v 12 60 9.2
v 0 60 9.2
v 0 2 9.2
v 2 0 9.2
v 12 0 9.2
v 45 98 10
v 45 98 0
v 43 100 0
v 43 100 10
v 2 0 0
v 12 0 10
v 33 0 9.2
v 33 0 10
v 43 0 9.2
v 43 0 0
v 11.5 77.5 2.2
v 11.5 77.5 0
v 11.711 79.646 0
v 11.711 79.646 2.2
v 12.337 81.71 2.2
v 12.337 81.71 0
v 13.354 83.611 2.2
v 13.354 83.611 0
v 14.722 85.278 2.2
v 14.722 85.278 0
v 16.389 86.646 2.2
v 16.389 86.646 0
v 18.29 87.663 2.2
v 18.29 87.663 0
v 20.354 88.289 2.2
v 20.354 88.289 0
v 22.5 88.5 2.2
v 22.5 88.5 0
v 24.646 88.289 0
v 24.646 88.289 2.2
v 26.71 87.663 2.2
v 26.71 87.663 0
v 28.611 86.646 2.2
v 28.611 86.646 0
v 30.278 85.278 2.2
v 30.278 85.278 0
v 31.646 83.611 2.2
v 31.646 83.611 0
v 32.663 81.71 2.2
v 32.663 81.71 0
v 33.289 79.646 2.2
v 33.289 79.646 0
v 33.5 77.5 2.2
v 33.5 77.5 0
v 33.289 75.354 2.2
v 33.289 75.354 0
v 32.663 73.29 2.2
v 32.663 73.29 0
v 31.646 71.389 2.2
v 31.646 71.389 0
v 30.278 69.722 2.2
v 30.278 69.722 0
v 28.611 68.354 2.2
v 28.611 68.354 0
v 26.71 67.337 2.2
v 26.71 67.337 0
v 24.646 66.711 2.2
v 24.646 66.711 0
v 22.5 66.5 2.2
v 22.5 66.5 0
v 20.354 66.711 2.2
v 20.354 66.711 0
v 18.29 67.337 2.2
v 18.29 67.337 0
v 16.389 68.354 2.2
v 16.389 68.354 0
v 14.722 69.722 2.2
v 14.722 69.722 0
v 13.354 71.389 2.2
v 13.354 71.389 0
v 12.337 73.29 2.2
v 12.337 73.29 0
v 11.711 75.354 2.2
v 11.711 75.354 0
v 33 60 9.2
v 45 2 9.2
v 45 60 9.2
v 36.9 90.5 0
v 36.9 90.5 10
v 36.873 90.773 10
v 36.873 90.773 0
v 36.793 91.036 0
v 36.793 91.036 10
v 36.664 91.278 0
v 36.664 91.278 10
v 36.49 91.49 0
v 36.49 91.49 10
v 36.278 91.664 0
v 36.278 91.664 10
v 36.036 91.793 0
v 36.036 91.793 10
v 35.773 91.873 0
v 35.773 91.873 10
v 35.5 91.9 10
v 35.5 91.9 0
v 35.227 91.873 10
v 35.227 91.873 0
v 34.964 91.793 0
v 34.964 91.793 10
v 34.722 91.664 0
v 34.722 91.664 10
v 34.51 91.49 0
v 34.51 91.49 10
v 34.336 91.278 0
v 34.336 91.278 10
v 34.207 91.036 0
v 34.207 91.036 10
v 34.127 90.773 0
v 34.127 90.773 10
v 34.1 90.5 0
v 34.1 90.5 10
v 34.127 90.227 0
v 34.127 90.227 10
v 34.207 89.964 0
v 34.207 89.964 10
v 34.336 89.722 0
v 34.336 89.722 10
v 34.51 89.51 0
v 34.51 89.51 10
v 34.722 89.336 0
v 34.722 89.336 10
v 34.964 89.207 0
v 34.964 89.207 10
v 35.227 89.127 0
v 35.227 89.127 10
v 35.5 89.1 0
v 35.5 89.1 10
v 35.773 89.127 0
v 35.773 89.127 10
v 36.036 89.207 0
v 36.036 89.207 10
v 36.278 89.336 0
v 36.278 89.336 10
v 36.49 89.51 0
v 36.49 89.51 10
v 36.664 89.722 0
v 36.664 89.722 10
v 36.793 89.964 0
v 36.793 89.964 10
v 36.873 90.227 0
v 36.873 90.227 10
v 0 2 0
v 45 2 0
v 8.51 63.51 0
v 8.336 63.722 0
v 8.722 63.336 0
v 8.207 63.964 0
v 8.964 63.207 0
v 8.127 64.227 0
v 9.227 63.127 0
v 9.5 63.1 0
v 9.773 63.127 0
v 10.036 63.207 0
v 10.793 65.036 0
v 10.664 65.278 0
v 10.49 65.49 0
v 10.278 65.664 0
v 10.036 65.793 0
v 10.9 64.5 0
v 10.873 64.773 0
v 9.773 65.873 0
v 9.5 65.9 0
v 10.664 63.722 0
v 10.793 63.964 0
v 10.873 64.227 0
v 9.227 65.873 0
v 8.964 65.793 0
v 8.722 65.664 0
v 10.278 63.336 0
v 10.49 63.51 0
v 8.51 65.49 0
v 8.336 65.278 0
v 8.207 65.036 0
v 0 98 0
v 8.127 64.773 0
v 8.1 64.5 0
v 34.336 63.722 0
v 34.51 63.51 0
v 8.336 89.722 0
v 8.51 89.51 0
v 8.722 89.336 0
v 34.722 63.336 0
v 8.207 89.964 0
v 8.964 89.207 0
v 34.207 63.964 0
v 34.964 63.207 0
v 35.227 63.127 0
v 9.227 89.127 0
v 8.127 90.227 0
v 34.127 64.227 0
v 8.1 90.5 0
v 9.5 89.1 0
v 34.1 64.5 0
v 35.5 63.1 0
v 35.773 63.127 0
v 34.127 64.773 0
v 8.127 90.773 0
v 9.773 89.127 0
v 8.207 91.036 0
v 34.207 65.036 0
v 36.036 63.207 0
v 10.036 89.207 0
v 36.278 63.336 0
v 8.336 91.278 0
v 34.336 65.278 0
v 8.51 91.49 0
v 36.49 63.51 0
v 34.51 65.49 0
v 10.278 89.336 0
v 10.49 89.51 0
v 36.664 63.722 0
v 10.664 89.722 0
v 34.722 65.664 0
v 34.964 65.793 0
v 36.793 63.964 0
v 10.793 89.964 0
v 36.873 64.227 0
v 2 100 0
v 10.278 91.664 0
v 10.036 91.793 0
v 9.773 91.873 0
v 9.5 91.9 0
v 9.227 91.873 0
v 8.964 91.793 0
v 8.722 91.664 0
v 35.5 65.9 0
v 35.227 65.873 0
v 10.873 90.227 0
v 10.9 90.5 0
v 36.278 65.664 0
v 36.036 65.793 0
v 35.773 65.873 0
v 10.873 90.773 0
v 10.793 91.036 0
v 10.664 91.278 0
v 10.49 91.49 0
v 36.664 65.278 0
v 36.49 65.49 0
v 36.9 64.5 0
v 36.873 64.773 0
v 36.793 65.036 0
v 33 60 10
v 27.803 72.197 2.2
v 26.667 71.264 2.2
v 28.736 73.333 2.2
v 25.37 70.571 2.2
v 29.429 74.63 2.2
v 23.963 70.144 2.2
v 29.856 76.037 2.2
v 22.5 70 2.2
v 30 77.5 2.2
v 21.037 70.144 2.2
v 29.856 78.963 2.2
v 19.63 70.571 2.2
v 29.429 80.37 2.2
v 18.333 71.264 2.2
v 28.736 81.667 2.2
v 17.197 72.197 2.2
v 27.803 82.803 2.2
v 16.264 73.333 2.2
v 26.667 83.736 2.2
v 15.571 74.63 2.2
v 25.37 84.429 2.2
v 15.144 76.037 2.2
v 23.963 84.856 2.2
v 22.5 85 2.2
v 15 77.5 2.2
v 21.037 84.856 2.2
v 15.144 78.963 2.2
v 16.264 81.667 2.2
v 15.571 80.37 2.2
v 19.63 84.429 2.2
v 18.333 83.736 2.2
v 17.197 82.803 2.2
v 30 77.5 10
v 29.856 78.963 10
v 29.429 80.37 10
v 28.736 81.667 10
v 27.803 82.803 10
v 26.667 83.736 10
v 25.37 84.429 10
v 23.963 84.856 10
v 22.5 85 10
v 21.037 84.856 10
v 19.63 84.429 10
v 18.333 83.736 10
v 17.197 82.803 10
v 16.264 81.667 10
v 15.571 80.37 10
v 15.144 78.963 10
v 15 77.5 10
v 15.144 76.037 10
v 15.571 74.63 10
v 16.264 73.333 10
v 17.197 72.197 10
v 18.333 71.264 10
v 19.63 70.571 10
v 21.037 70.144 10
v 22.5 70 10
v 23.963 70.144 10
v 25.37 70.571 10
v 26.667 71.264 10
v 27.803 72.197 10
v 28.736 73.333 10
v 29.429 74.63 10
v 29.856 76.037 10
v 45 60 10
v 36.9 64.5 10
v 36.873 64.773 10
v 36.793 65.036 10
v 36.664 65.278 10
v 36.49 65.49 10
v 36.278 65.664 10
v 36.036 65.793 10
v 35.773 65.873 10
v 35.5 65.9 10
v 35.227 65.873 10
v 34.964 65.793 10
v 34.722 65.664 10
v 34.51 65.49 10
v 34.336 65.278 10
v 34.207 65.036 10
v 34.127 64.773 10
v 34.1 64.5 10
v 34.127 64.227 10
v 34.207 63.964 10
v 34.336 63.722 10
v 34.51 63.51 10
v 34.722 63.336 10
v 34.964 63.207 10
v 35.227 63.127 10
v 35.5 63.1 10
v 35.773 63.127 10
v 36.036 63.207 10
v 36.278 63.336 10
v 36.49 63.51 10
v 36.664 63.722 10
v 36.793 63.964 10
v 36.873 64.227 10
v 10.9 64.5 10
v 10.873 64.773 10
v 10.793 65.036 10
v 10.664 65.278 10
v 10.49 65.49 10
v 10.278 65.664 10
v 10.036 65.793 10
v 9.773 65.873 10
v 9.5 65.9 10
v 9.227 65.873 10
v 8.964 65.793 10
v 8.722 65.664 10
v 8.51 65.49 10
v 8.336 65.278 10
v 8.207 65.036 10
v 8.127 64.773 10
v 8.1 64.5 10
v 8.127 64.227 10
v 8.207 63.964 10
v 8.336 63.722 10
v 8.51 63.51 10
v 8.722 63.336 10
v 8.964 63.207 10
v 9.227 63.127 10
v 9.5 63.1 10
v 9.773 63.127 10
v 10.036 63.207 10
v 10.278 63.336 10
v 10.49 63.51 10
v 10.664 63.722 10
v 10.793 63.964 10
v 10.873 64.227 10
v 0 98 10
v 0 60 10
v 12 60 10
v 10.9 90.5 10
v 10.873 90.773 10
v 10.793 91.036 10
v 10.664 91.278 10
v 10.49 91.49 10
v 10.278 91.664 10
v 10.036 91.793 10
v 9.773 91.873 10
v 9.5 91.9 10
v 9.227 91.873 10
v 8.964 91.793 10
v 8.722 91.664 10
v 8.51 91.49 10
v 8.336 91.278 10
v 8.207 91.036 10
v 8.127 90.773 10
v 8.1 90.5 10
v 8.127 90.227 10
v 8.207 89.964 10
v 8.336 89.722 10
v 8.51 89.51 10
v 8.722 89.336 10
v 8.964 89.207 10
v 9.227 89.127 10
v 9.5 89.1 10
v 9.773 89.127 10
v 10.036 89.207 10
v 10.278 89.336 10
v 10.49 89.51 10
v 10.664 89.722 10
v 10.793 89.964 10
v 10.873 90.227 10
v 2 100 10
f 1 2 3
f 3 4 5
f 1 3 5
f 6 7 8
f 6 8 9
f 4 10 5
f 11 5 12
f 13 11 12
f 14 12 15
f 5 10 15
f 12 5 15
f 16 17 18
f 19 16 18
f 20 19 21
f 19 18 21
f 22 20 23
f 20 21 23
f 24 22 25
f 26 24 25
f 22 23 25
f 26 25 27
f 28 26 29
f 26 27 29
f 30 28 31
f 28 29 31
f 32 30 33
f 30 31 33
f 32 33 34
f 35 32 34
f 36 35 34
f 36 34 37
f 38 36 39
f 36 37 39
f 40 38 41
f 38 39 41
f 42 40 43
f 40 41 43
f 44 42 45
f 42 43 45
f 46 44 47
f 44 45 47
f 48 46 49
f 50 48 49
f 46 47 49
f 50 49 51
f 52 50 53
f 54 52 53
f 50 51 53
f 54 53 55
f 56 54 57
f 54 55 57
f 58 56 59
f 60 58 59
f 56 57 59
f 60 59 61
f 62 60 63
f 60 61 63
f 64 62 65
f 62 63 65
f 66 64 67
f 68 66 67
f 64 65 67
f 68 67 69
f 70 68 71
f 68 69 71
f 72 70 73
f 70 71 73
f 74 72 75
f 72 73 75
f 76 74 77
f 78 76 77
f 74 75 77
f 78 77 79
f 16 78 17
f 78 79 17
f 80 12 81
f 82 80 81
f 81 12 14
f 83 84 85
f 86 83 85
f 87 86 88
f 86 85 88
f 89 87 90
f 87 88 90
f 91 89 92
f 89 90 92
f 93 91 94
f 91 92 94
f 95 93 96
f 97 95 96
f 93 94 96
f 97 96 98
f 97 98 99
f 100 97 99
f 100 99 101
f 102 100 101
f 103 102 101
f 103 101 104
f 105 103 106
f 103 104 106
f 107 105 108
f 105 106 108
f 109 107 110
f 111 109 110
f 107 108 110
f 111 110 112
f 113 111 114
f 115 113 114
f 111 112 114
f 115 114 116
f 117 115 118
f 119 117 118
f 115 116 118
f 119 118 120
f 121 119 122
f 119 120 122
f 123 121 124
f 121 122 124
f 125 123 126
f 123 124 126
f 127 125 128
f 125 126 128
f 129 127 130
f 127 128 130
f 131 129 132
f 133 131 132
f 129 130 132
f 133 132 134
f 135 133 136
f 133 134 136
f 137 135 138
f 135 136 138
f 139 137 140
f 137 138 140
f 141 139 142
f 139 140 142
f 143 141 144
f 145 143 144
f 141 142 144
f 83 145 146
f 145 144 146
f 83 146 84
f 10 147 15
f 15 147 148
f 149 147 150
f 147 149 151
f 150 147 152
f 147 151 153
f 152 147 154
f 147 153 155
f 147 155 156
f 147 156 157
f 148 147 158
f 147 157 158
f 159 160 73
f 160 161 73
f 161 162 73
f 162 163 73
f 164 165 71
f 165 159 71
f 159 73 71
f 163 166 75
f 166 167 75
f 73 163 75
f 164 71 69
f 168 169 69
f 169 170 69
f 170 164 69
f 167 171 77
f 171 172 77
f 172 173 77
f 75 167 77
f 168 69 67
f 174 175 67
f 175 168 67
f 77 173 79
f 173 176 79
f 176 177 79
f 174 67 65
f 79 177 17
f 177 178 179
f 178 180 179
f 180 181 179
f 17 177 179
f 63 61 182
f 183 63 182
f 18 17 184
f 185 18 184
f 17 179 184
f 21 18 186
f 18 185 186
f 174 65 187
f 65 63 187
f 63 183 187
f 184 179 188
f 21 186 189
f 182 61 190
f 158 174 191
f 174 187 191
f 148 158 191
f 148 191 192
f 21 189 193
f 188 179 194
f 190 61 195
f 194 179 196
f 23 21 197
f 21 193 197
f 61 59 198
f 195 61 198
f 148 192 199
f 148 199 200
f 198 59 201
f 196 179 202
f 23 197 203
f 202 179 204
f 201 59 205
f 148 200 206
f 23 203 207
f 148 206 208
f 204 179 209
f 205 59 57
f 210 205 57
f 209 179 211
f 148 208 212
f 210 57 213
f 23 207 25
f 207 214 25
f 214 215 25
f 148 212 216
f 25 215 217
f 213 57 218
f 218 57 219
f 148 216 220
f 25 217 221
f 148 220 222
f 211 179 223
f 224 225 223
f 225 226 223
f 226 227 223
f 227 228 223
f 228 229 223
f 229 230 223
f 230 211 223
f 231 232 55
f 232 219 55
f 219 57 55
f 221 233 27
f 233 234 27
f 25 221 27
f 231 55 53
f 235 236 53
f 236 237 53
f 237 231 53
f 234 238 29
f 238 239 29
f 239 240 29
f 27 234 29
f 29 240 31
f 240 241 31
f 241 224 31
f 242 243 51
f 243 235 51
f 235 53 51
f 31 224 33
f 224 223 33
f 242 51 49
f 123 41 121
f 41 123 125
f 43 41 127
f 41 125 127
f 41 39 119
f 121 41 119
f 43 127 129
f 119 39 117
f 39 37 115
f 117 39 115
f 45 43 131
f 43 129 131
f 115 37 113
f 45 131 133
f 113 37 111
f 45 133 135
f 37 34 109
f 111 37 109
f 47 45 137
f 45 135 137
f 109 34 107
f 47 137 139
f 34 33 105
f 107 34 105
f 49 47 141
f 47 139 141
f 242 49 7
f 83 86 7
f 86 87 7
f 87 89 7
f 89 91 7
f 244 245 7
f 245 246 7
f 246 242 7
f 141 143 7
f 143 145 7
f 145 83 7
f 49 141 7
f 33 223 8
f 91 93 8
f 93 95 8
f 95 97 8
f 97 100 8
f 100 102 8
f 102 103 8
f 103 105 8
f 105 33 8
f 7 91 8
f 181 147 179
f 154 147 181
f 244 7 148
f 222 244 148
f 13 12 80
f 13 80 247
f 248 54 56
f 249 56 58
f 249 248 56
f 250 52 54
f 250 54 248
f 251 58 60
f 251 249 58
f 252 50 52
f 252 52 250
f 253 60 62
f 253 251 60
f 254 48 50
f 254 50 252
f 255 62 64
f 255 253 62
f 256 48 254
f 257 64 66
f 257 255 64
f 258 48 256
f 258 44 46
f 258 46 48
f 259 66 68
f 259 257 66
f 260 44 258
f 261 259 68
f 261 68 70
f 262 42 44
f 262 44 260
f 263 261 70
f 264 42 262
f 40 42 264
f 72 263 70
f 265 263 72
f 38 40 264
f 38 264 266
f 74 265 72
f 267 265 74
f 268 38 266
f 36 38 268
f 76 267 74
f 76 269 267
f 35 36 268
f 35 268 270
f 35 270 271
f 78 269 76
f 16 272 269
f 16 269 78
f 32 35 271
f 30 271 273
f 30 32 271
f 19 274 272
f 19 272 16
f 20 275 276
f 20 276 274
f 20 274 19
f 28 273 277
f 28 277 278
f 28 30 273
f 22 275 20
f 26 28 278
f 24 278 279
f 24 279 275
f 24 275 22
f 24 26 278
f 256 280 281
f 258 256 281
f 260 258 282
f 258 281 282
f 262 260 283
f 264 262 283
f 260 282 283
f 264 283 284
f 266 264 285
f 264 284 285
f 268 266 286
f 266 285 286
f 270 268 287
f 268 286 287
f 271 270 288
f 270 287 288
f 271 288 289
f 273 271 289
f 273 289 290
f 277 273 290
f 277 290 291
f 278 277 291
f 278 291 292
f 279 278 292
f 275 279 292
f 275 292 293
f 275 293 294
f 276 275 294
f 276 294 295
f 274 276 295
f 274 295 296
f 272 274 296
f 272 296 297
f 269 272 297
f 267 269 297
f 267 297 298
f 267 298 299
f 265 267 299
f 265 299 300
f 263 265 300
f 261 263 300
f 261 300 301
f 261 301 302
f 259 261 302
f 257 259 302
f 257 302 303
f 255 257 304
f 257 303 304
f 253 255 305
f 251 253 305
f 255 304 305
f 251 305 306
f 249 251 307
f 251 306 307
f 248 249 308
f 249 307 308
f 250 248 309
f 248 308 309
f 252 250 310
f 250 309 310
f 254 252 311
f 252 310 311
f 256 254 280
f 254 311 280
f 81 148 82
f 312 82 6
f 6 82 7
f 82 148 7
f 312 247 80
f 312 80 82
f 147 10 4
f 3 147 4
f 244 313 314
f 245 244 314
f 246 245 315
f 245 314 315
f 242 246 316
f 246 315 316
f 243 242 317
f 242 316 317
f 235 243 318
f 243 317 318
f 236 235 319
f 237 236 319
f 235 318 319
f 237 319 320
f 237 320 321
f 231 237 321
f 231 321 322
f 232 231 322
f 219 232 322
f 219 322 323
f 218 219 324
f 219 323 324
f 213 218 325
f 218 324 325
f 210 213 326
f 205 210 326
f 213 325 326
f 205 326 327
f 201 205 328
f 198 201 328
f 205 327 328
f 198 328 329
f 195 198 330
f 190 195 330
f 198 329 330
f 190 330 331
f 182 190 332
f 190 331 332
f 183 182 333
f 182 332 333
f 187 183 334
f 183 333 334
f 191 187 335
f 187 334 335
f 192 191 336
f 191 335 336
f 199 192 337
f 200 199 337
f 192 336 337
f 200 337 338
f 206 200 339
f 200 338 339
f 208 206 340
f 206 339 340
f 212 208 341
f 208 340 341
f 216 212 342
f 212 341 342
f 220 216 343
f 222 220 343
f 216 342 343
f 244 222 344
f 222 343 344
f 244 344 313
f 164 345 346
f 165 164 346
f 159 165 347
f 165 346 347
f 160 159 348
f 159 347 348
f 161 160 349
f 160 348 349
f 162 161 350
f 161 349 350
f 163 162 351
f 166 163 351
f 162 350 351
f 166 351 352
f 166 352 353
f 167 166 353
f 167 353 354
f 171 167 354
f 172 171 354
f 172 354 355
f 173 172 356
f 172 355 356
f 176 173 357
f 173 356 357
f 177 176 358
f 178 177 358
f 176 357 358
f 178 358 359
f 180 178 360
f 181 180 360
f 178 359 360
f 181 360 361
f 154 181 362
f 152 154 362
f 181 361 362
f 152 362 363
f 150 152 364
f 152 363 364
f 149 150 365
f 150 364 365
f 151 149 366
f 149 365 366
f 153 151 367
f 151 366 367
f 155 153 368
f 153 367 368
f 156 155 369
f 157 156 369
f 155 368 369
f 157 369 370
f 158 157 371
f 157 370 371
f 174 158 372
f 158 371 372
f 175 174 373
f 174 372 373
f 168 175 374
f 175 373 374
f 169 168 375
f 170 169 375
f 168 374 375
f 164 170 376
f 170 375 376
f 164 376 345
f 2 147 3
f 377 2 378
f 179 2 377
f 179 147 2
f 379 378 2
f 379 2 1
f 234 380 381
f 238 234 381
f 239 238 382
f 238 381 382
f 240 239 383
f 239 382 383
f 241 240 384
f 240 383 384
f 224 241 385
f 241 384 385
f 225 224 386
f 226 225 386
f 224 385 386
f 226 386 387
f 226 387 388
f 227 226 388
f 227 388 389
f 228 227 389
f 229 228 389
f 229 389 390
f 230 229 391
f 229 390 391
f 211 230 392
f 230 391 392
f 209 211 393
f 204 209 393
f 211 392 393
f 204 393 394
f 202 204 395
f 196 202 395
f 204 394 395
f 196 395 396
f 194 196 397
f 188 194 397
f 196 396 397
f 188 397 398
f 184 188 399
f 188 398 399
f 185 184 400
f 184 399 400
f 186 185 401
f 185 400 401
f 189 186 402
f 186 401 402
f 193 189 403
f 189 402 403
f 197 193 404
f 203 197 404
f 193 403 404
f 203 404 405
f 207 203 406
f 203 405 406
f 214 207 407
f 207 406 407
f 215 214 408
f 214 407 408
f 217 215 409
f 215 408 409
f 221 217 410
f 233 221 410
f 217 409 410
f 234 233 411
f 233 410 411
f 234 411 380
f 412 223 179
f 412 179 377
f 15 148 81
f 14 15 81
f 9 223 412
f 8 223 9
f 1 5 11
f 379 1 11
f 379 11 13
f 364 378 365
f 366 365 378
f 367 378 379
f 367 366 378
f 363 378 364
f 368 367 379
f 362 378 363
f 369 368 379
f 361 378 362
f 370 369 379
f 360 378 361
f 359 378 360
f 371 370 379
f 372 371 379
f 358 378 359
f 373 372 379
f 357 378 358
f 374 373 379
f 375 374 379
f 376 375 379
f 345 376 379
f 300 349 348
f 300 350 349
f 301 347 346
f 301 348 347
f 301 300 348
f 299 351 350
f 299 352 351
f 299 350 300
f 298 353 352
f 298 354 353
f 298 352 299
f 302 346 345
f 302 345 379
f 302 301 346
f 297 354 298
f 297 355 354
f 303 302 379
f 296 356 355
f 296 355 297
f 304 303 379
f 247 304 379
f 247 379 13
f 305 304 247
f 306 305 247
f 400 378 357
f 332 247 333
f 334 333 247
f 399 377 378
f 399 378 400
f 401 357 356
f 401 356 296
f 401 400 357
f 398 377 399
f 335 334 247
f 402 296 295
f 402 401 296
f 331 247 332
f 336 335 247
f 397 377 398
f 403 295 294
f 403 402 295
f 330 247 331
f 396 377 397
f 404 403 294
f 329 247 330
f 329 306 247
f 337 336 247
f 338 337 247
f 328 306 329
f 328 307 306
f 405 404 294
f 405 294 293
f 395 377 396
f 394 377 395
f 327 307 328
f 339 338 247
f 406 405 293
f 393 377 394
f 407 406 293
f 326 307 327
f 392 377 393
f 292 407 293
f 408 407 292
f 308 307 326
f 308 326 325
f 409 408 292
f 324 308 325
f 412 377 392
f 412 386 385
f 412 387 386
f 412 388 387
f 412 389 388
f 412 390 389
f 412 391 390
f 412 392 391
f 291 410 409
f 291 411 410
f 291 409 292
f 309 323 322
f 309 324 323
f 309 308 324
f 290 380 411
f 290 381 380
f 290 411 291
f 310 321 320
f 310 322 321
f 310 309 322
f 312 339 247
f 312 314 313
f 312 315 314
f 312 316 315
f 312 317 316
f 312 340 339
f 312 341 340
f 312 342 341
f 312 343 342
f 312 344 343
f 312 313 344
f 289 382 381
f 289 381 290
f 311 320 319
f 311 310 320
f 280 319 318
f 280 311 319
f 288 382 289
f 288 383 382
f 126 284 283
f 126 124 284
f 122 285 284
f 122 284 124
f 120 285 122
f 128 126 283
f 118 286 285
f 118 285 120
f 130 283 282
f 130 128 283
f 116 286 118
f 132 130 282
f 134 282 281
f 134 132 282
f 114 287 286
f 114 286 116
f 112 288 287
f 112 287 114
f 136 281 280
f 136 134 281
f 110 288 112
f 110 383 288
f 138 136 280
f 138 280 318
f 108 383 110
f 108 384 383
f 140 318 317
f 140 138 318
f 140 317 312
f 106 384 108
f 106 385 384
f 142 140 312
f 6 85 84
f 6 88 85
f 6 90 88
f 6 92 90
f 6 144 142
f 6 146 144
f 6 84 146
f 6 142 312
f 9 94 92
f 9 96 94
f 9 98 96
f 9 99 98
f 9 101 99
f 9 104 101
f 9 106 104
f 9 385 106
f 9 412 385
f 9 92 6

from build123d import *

# Parameters (mm, degrees)
SKETCH1_W           = 45
SKETCH1_H           = 100
BOSS_EXTRUDE1_DEPTH = 10
SKETCH3_R           = 7.5
SKETCH3_R_2         = 1.4
CUT_EXTRUDE1_DEPTH  = 10
SKETCH4_R           = 11
CUT_EXTRUDE2_DEPTH  = 2.2
SKETCH5_W           = 12
SKETCH5_H           = 0.8
CUT_EXTRUDE3_DEPTH  = 60
CHAMFER1_SIZE       = 2


with BuildPart() as part:
    # Sketch1 → Boss-Extrude1 (new body)
    with BuildSketch(Plane.XY):
        with Locations((22.5, 50)):
            Rectangle(SKETCH1_W, SKETCH1_H)
    extrude(amount=BOSS_EXTRUDE1_DEPTH)

    # Sketch3 → Cut-Extrude1 (cut)
    with BuildSketch(Plane.XY.offset(10)):
        with Locations((22.5, 77.5)):
            Circle(SKETCH3_R)
        with Locations((9.5, 90.5)):
            Circle(SKETCH3_R_2)
        with Locations((35.5, 90.5)):
            Circle(SKETCH3_R_2)
        with Locations((35.5, 64.5)):
            Circle(SKETCH3_R_2)
        with Locations((9.5, 64.5)):
            Circle(SKETCH3_R_2)
    extrude(amount=-CUT_EXTRUDE1_DEPTH, mode=Mode.SUBTRACT)

    # Sketch4 → Cut-Extrude2 (cut)
    with BuildSketch(Plane(origin=(0, 0, 0), x_dir=(-1, 0, 0), z_dir=(0, 0, -1))):
        with Locations((-22.5, 77.5)):
            Circle(SKETCH4_R)
    extrude(amount=-CUT_EXTRUDE2_DEPTH, mode=Mode.SUBTRACT)

    # Sketch5 → Cut-Extrude3 (cut)
    with BuildSketch(Plane.XZ):
        with Locations((6, 9.6)):
            Rectangle(SKETCH5_W, SKETCH5_H)
        with Locations((39, 9.6)):
            Rectangle(SKETCH5_W, SKETCH5_H)
    extrude(amount=-CUT_EXTRUDE3_DEPTH, mode=Mode.SUBTRACT)

    # Chamfer1
    chamfer1_edges = [part.edges().sort_by_distance(p)[0] for p in [
        (45, 0, 4.6),
        (0, 0, 4.6),
        (0, 100, 5),
        (45, 100, 5),
    ]]
    chamfer(chamfer1_edges, length=CHAMFER1_SIZE)


solid = part.part
